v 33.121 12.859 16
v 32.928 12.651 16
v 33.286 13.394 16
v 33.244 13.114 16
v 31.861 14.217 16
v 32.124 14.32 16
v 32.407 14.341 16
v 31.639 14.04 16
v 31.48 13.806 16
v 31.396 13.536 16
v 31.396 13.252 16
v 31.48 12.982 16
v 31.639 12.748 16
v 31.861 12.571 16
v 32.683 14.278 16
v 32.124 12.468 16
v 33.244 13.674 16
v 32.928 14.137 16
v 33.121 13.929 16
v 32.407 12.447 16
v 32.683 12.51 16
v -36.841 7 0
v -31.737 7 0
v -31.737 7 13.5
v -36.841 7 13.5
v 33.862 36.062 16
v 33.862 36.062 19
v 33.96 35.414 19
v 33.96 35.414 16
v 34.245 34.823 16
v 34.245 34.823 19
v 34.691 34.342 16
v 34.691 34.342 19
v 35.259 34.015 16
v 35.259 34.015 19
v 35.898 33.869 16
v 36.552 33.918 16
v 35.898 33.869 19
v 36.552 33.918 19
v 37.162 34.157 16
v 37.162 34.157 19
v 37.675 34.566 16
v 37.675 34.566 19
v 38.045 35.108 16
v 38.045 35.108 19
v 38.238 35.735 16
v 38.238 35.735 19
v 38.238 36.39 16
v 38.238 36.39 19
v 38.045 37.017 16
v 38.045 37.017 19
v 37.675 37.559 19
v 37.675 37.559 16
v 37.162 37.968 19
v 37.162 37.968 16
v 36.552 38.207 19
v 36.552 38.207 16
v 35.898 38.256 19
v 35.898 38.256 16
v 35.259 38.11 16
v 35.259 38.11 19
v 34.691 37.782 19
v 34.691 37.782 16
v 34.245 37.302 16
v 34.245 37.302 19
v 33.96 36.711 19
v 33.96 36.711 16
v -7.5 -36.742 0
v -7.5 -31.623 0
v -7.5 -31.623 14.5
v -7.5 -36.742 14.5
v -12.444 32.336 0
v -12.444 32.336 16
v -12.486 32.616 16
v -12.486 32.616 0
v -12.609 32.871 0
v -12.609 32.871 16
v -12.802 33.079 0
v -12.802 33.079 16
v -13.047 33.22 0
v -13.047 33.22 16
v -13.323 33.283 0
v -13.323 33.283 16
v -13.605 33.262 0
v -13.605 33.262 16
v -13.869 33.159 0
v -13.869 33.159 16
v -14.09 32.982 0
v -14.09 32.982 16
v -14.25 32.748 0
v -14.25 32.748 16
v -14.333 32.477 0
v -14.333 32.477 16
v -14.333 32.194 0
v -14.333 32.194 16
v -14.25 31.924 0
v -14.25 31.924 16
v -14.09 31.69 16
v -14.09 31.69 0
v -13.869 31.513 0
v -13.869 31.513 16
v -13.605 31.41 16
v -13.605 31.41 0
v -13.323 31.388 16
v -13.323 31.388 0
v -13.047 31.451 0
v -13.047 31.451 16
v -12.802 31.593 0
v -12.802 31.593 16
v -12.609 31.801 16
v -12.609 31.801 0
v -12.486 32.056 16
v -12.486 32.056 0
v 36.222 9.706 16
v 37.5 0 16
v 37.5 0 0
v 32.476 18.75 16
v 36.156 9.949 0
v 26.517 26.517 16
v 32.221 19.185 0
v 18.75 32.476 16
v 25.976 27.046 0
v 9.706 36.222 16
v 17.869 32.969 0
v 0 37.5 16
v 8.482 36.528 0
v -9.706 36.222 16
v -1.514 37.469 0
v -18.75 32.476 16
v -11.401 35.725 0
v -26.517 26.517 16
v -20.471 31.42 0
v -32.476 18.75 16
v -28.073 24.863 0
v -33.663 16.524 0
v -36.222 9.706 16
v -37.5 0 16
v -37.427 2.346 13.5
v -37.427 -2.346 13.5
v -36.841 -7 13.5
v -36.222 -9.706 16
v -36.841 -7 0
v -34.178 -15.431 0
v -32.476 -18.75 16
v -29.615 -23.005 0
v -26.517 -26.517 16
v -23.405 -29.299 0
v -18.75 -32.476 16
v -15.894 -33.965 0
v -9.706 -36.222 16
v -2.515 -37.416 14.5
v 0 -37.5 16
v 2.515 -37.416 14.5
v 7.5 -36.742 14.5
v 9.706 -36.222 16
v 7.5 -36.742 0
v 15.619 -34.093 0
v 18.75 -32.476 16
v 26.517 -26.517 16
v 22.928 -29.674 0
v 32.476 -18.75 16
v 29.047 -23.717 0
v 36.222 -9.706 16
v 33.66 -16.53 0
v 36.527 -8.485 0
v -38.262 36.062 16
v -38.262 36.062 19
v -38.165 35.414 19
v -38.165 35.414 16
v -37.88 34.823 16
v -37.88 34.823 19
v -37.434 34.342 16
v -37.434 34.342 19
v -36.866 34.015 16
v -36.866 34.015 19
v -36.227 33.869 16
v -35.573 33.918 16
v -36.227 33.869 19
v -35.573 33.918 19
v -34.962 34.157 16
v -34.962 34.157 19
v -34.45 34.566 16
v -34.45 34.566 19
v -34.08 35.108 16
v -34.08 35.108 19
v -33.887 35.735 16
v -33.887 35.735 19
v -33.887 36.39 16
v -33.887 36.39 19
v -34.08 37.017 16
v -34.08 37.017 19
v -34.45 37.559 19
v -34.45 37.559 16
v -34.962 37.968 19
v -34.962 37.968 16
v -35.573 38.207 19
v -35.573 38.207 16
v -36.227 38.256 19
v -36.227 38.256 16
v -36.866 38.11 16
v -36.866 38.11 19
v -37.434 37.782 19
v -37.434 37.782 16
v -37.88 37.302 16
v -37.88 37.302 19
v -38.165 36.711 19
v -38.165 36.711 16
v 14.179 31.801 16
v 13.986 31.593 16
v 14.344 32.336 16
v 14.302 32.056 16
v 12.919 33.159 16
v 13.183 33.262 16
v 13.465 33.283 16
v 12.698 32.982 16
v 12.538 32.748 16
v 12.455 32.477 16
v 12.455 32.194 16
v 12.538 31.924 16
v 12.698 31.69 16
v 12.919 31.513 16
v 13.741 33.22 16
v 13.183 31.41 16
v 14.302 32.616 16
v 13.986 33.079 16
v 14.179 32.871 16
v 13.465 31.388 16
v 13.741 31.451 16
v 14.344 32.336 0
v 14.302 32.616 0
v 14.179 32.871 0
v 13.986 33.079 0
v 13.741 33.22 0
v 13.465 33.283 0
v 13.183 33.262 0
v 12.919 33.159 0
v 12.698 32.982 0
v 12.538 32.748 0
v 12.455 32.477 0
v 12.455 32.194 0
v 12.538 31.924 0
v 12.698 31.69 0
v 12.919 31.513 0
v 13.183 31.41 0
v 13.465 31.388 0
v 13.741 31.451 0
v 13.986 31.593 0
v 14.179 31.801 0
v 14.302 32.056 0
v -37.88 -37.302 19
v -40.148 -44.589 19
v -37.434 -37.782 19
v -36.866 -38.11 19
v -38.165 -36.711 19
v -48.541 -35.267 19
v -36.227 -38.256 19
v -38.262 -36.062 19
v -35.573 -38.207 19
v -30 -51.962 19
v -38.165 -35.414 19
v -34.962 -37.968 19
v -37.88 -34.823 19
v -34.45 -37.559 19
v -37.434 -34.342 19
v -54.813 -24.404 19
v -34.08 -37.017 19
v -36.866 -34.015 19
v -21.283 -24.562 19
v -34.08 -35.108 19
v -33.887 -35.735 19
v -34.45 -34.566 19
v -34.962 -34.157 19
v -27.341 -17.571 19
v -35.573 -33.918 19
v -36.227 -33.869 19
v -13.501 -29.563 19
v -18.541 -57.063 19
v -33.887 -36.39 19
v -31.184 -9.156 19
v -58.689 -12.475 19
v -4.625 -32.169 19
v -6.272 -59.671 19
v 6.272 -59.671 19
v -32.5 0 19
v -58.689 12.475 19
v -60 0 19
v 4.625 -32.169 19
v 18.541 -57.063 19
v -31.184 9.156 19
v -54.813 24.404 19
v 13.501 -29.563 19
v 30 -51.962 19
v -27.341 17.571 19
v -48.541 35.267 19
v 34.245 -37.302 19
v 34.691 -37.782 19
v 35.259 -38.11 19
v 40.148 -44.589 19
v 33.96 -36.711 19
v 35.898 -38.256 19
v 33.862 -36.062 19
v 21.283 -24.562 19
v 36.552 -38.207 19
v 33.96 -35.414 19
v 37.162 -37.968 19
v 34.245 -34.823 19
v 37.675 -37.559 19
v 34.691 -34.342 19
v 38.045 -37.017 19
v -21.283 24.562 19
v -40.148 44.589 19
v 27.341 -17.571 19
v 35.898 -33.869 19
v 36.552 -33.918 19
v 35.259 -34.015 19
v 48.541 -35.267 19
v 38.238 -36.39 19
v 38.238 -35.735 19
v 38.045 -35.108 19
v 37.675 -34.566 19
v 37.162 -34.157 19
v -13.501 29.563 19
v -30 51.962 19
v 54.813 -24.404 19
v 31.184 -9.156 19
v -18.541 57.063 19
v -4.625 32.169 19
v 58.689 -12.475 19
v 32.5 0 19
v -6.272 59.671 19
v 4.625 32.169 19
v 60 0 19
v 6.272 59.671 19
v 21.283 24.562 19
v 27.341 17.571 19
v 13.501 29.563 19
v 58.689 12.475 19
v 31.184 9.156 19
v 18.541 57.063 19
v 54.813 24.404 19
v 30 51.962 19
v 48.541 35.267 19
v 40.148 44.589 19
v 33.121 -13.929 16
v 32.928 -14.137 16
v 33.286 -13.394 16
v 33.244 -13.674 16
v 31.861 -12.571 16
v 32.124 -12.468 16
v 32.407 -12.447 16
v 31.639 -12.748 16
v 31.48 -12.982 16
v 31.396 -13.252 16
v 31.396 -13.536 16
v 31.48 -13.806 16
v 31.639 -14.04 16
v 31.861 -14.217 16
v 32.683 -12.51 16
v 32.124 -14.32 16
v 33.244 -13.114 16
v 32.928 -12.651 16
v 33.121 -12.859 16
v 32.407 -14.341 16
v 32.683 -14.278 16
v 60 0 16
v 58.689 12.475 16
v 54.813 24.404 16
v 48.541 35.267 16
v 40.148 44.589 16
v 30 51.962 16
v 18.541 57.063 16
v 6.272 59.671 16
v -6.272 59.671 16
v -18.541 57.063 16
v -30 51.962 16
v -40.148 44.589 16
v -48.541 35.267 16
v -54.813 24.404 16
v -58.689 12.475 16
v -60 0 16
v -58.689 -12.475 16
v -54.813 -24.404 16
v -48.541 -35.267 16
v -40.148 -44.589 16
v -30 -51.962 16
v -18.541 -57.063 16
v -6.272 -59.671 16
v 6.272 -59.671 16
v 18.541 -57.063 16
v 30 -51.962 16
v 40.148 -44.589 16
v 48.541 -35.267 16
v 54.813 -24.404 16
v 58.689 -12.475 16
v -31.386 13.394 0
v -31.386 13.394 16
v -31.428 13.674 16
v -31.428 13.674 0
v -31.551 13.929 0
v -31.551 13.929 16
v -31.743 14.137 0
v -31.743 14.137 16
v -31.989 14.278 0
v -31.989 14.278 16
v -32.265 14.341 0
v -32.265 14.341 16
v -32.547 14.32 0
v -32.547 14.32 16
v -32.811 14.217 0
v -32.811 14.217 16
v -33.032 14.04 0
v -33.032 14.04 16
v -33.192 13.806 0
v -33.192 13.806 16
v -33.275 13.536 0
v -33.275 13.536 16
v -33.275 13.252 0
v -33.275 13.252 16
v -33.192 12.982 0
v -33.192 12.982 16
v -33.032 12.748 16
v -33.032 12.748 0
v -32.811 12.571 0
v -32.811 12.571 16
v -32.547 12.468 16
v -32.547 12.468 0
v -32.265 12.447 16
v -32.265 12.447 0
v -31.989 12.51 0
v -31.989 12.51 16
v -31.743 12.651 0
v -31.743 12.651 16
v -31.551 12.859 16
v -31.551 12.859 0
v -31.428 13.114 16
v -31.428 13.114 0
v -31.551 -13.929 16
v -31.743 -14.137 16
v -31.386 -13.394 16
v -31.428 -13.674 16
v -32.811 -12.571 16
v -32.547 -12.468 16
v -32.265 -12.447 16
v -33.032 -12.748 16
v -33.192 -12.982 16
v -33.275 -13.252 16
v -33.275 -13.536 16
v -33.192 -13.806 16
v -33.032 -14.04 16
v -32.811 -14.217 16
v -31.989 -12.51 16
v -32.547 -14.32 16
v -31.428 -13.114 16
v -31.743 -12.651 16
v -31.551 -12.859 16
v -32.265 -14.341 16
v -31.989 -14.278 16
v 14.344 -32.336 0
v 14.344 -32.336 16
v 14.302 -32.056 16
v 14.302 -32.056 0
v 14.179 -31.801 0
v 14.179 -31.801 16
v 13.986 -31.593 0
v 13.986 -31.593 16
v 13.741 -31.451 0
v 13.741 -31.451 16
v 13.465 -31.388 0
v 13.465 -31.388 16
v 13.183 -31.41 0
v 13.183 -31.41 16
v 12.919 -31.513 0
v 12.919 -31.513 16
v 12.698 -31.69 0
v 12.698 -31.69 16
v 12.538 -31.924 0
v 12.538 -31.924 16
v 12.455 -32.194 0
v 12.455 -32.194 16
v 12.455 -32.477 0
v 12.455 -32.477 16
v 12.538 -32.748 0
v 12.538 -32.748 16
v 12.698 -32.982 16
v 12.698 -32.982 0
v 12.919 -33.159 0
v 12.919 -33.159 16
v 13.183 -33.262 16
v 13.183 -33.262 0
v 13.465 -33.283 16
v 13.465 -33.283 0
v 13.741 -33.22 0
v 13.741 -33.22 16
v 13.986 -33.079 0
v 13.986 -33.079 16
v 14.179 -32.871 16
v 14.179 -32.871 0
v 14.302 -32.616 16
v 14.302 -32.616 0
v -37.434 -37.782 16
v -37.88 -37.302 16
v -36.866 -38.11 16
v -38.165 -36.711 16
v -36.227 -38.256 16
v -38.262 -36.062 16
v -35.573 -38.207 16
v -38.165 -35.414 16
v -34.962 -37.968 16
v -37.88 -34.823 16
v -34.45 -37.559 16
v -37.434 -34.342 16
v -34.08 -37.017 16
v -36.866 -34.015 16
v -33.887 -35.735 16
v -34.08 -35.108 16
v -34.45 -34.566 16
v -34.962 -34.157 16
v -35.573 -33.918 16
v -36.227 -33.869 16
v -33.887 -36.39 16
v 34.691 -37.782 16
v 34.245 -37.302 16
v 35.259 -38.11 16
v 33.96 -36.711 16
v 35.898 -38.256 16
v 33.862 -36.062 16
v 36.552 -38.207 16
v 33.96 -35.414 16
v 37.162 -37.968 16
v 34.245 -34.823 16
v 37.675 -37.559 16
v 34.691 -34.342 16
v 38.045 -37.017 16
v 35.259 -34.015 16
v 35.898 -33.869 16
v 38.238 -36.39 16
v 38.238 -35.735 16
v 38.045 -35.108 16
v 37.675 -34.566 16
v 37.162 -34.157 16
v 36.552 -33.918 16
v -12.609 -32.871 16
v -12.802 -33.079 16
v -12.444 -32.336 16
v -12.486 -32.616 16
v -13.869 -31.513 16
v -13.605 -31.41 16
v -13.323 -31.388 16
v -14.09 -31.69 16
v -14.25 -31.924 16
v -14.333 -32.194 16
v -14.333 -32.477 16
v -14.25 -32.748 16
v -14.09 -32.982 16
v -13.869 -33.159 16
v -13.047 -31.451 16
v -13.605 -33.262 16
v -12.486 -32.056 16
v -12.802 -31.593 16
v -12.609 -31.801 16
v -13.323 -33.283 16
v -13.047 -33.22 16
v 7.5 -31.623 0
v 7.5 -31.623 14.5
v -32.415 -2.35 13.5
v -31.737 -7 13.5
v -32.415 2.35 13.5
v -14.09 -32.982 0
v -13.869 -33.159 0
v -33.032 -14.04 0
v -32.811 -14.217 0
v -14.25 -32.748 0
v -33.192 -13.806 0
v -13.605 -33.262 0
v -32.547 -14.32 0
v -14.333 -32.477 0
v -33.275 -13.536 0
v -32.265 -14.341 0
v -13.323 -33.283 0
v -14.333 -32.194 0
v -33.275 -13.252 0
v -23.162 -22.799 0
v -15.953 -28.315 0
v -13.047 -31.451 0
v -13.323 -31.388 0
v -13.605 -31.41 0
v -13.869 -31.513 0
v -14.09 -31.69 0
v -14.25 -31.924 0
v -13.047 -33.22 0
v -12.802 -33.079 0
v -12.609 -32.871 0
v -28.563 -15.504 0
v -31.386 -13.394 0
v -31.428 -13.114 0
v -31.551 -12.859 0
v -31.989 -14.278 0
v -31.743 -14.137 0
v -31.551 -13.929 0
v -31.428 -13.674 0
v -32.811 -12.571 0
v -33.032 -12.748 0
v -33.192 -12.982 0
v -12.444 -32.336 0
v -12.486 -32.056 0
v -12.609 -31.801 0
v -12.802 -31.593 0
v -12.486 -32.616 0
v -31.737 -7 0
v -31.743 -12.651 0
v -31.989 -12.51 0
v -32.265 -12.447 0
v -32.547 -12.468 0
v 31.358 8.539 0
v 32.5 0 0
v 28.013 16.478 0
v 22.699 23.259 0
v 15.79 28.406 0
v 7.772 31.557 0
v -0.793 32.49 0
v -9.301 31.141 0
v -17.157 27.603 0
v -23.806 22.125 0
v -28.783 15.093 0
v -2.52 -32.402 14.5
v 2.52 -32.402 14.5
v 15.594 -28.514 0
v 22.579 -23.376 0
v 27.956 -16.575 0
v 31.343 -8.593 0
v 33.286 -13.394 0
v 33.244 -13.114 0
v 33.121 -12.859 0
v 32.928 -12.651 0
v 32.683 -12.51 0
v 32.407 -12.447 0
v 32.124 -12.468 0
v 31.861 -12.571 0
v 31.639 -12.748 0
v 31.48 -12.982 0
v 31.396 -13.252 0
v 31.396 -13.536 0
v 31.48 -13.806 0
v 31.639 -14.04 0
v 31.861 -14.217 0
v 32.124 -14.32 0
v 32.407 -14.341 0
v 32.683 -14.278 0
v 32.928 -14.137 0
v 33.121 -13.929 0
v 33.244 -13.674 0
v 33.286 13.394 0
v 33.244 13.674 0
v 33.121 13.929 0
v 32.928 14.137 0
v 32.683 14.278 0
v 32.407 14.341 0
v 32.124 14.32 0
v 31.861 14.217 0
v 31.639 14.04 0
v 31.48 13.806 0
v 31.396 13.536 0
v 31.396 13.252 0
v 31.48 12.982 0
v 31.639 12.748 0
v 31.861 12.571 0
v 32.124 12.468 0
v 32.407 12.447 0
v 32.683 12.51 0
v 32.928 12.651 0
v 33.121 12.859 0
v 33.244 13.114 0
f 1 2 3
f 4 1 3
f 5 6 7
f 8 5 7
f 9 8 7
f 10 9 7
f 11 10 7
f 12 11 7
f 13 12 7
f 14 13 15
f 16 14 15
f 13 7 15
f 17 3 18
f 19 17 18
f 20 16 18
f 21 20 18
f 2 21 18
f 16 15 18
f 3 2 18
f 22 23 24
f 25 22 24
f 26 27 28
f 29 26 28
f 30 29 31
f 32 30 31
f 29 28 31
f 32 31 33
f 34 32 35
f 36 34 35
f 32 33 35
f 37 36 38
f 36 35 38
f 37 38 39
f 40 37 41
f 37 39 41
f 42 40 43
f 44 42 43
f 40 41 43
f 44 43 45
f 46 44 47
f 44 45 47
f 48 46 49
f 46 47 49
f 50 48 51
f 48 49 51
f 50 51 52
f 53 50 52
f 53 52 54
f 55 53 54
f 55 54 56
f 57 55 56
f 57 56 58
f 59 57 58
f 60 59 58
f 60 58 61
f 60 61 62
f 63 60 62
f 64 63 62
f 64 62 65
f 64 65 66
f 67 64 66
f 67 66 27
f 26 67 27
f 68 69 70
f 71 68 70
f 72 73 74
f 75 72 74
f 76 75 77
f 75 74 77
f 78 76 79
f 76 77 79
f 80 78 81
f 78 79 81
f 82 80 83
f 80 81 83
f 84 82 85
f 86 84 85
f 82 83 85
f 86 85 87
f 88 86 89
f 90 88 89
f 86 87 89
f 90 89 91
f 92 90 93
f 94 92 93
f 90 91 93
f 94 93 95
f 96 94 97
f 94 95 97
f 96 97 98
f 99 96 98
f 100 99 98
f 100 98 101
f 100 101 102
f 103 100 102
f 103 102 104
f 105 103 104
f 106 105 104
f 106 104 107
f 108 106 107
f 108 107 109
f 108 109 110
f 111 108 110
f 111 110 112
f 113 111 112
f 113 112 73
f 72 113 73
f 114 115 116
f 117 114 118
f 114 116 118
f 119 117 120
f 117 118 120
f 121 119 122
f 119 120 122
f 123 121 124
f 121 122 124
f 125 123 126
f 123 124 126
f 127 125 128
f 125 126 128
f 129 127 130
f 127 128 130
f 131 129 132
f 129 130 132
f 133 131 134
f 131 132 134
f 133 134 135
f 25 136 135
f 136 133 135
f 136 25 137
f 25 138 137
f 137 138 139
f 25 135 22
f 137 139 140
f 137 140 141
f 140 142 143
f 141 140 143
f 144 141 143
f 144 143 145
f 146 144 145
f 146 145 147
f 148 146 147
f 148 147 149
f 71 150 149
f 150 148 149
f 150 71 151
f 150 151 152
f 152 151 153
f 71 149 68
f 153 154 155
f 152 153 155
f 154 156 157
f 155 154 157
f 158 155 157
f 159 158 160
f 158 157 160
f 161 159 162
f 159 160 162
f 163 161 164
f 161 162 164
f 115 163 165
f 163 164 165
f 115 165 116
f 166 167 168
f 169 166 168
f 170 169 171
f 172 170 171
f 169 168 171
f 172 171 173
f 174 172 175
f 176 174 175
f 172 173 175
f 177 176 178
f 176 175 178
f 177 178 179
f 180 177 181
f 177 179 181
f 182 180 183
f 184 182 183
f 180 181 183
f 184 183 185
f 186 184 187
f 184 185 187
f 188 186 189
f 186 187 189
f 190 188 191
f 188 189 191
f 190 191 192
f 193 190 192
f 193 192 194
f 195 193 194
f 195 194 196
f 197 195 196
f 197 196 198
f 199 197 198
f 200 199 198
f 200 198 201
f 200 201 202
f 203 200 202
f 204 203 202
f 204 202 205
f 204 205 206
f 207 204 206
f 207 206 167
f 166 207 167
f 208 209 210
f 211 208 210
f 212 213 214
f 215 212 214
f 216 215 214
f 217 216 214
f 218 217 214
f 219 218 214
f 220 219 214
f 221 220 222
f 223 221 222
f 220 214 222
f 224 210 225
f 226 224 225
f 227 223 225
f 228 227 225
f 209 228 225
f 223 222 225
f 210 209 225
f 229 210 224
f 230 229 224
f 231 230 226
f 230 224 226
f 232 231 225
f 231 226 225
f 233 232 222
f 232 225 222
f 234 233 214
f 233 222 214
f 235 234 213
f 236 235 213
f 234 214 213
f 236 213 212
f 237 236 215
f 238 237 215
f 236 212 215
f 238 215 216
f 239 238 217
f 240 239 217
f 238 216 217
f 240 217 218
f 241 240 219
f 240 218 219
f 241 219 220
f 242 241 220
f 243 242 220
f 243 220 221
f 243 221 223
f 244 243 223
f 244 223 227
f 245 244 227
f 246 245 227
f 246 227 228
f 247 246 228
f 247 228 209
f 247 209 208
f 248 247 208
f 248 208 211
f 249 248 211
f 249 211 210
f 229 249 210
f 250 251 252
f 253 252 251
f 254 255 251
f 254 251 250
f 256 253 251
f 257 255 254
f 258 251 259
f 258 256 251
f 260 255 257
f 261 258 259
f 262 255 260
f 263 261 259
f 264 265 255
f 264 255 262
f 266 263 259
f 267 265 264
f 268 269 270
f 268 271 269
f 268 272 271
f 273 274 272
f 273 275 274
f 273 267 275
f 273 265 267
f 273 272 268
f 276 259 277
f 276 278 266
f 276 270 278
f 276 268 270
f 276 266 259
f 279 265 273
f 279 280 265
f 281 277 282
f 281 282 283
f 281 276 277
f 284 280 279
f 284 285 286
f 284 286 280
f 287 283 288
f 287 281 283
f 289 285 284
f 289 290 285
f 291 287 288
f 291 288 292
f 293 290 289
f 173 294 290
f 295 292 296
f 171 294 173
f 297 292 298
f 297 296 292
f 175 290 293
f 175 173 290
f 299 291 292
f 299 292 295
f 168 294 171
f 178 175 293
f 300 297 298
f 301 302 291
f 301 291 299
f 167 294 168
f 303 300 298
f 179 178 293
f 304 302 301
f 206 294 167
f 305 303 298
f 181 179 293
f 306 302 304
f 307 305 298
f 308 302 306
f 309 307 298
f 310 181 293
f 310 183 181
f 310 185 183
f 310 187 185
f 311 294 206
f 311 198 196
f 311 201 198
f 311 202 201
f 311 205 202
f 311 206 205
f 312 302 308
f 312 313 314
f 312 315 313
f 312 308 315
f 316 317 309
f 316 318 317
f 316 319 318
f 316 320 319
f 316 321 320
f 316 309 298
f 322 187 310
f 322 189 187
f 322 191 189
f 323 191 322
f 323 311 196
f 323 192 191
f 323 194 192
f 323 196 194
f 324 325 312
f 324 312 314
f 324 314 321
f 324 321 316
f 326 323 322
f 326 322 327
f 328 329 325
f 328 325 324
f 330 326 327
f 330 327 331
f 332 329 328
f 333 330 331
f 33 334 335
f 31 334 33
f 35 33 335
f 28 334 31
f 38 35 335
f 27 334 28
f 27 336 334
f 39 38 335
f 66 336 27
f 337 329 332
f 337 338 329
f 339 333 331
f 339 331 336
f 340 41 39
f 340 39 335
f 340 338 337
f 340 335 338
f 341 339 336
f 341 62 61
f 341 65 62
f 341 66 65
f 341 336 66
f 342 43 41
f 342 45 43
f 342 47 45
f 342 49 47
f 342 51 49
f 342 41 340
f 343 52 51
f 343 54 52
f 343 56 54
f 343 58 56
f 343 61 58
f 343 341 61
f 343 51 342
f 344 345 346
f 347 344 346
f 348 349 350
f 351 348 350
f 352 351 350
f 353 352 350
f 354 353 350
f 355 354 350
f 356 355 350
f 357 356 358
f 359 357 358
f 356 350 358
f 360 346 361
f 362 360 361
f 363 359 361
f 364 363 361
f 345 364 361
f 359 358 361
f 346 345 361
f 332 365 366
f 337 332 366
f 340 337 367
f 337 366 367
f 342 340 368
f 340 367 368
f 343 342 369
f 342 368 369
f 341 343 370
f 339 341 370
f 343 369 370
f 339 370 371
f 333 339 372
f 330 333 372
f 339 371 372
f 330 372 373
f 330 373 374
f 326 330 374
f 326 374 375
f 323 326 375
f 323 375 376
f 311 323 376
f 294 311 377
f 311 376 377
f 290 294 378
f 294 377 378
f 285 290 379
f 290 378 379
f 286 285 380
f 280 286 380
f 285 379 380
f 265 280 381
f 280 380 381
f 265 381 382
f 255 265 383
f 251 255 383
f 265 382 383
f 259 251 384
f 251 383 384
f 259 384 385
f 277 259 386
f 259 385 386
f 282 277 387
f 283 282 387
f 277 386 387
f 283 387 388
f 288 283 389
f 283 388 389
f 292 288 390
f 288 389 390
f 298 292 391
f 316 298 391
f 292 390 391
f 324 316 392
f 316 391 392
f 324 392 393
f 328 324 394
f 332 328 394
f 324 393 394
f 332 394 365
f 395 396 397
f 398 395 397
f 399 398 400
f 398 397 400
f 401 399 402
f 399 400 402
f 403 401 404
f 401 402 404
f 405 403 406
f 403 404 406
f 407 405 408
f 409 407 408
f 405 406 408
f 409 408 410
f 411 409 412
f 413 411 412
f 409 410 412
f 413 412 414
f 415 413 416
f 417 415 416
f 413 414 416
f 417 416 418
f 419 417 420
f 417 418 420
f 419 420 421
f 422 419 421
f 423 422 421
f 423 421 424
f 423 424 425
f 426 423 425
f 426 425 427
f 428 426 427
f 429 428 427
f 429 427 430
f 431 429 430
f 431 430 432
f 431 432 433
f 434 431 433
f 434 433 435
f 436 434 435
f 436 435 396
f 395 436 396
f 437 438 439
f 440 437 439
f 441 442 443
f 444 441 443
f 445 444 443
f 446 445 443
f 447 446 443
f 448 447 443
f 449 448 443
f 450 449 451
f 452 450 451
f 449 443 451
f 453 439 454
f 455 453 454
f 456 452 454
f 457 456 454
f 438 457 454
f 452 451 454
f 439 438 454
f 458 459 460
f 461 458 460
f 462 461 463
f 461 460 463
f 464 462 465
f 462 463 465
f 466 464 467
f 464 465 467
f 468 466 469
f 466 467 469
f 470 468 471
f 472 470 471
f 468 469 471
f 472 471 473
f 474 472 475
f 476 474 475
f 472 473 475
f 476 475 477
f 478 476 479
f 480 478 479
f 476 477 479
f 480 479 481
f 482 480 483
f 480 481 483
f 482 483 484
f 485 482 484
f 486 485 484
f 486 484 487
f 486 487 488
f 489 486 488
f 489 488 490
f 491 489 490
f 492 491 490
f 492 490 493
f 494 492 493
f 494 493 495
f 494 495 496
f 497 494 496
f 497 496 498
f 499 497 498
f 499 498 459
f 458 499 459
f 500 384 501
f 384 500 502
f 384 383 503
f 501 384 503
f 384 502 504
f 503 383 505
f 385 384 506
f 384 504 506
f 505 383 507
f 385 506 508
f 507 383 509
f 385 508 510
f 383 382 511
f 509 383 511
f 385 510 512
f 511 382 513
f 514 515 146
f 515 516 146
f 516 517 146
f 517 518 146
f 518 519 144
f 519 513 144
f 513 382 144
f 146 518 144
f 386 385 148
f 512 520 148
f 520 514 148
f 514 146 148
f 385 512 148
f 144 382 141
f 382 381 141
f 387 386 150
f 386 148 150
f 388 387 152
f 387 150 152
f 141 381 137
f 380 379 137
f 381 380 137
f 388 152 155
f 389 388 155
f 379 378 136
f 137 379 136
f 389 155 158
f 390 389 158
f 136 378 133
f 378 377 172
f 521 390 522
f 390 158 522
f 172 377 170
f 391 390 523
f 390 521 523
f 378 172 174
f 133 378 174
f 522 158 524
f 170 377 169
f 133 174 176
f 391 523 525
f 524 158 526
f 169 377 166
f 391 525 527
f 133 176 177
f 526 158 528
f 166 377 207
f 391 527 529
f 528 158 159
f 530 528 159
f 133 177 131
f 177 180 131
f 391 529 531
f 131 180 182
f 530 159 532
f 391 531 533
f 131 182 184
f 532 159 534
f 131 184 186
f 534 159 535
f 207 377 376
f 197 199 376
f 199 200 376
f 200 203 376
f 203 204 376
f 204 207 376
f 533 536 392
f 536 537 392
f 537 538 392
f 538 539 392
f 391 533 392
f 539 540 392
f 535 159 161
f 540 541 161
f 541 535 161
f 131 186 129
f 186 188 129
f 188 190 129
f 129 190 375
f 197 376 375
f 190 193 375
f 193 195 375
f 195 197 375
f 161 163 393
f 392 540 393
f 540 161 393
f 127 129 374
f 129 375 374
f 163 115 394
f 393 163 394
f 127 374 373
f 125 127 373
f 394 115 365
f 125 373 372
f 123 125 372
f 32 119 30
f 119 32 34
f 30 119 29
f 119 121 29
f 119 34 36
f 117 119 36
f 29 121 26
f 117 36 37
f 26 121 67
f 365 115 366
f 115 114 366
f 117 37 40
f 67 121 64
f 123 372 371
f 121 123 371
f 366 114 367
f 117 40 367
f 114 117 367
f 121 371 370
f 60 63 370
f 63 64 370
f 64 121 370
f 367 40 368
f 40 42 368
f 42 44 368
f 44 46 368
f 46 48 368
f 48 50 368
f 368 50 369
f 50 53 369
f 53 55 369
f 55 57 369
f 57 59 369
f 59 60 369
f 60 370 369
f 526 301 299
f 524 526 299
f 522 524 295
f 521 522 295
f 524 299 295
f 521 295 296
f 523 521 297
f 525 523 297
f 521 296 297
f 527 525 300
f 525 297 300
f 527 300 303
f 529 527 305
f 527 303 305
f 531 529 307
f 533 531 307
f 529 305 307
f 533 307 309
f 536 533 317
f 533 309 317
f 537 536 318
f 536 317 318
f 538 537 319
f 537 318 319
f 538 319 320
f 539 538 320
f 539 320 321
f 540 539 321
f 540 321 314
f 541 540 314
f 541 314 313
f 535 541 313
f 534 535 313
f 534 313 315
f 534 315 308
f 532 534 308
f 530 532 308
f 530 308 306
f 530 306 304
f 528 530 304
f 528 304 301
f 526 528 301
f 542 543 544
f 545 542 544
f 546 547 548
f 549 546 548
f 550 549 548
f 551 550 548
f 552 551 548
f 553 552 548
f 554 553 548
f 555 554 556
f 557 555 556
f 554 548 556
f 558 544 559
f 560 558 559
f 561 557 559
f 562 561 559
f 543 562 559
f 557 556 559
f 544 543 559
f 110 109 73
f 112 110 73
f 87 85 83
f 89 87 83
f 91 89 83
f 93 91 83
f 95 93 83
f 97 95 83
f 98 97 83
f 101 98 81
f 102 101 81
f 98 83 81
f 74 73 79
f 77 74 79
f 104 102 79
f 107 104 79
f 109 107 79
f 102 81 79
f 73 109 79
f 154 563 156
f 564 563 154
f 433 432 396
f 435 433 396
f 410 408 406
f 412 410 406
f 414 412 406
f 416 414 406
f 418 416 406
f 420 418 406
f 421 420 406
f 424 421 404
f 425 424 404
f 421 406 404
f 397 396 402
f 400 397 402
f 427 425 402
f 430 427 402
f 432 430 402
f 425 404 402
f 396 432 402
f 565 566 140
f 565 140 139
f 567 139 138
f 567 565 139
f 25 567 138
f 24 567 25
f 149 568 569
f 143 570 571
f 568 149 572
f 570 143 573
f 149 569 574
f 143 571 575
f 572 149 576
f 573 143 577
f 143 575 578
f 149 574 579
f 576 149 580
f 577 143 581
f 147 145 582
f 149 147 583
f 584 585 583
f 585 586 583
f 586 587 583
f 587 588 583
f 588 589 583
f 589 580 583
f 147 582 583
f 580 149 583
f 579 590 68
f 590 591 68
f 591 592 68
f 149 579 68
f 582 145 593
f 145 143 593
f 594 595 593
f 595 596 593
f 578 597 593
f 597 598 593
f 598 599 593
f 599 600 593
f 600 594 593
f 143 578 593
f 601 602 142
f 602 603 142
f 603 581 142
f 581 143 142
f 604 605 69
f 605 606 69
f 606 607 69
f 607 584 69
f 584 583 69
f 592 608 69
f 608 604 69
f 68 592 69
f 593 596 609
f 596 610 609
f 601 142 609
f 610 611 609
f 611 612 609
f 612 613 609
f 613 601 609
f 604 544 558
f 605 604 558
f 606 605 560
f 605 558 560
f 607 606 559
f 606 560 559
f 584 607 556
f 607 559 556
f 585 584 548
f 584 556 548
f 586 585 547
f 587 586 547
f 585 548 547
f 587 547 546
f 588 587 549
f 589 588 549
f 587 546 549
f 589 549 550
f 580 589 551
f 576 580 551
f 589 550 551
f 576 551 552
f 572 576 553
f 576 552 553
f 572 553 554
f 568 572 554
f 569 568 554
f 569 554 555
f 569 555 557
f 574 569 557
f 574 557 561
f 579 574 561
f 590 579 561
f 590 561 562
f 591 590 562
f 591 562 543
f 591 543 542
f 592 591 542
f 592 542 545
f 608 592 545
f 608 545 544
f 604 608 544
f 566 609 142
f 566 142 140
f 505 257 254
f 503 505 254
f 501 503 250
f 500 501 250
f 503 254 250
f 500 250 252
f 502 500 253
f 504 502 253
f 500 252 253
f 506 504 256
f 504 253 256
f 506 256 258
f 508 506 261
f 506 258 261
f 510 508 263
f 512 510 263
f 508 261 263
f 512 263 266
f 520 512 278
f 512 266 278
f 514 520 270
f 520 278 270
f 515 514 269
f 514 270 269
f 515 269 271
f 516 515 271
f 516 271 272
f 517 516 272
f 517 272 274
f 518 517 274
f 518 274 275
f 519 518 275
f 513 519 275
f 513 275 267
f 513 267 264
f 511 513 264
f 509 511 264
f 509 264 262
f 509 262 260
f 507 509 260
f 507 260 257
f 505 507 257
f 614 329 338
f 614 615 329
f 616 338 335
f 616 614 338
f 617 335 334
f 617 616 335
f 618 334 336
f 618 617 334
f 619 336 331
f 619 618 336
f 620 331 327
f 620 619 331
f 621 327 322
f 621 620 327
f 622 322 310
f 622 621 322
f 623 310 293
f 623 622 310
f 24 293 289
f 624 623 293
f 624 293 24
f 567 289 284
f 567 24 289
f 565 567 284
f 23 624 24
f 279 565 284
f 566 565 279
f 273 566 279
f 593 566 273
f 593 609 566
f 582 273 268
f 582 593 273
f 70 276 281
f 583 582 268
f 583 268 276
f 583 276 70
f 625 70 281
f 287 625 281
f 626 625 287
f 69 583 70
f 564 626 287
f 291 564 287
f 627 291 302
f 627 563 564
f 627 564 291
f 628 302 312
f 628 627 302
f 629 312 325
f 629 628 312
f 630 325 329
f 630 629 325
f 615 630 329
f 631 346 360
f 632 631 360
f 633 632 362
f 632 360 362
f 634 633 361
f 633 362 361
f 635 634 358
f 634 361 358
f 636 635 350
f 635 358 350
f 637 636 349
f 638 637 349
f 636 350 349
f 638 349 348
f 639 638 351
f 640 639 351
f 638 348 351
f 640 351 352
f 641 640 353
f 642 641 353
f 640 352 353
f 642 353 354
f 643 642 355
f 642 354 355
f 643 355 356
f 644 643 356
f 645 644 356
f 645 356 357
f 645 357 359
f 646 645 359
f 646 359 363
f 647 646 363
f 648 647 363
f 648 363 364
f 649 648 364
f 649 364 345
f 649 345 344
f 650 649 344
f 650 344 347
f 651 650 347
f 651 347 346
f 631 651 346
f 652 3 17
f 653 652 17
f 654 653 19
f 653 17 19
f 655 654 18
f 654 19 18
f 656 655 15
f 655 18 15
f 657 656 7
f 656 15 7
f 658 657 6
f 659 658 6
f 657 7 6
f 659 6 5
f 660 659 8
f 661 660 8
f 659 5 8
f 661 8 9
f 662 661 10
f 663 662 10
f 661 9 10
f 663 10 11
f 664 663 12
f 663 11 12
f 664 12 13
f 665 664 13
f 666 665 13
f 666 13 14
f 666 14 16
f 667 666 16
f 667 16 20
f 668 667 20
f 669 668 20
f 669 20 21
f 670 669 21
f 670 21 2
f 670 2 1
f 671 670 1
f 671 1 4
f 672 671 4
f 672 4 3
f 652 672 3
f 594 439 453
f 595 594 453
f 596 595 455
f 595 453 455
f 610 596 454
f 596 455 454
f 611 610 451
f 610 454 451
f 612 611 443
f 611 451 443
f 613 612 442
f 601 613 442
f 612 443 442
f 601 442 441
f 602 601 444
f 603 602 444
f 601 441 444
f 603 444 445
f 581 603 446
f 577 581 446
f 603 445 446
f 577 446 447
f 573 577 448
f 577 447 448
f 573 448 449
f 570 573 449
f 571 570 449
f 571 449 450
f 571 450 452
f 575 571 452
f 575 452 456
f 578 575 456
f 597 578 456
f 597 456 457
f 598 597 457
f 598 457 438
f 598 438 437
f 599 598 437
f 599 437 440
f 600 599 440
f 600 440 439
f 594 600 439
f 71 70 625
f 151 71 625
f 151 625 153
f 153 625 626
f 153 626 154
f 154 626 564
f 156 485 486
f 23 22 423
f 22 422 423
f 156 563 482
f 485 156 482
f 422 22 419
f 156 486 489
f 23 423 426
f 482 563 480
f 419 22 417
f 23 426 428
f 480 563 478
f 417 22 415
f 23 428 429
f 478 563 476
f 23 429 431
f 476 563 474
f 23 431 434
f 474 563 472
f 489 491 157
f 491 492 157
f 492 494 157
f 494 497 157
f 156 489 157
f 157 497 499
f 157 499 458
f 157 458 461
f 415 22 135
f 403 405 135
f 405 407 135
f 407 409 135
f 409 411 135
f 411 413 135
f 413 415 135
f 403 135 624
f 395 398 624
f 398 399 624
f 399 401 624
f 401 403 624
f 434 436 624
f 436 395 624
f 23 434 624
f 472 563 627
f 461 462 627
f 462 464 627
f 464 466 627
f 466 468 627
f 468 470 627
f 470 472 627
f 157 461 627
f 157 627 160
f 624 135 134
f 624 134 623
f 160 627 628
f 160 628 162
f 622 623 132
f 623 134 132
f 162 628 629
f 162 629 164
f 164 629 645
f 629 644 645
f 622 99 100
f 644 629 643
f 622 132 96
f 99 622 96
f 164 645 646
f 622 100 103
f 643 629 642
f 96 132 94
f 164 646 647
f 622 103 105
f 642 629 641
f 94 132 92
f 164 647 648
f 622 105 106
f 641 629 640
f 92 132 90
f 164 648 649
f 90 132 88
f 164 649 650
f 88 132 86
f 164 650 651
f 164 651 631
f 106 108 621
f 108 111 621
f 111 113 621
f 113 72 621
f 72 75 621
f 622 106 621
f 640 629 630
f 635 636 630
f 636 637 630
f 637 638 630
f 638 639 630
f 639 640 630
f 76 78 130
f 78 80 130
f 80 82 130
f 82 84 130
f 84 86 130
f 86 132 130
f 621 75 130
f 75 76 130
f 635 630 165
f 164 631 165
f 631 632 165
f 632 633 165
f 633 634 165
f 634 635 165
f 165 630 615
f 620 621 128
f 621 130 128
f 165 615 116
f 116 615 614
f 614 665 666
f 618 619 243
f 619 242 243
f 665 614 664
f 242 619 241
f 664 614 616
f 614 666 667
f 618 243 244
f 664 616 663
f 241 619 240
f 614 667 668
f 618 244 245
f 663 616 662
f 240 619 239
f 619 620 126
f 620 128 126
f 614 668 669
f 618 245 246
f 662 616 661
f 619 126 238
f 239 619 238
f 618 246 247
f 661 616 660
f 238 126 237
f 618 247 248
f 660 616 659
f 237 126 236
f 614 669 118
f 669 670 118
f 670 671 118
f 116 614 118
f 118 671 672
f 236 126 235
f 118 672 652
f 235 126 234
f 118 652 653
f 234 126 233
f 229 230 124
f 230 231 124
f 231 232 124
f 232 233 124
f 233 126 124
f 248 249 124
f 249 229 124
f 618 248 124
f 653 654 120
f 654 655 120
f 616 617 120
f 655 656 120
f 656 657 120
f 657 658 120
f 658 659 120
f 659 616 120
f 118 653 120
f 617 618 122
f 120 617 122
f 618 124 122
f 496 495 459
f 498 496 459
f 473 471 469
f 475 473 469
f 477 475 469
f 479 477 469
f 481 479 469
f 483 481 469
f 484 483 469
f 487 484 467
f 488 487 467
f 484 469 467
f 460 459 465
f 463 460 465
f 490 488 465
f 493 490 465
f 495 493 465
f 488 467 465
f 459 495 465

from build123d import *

# Parameters (mm, degrees)
F0_R     = 37.5
F0_R_2   = 32.5
F1_DEPTH = 16
F2_W     = 14
F2_H     = 13.5
F3_DEPTH = 37.501
F4_W     = 15
F4_H     = 14.5
F5_DEPTH = 50
F6_R     = 60
F6_R_2   = 37.5
F6_R_3   = 32.5
F7_DEPTH = 3
F8_D     = 1.9
F8_DEPTH = 50
F8_TIP   = 0.5708175881
F9_D     = 4.4
F9_DEPTH = 50
F9_TIP   = 1.3218933619


with BuildPart() as f1:
    # F0 (on Top) → F1 (new body)
    with BuildSketch(Plane.XY):
        Circle(F0_R)
        Circle(F0_R_2, mode=Mode.SUBTRACT)
    extrude(amount=F1_DEPTH)

    # F2 (on Right) → F3 (cut, through all)
    with BuildSketch(Plane.YZ):
        with Locations((0, 6.75)):
            Rectangle(F2_W, F2_H)
    extrude(amount=-F3_DEPTH, mode=Mode.SUBTRACT)

    # F4 (on Front) → F5 (cut)
    with BuildSketch(Plane.XZ):
        with Locations((0, 7.25)):
            Rectangle(F4_W, F4_H)
    extrude(amount=F5_DEPTH, mode=Mode.SUBTRACT)

    # F6 (on face) → F7 (join)
    with BuildSketch(Plane.XY.offset(16)):
        Circle(F6_R)
        Circle(F6_R_2, mode=Mode.SUBTRACT)
        Circle(F6_R_2)
        Circle(F6_R_3, mode=Mode.SUBTRACT)
    extrude(amount=F7_DEPTH)

    # F8 (one way)
    with BuildSketch(Plane.XY.offset(16)):
        with Locations((32.3357836379, -13.3939201328), (13.3939201328, 32.3357836379), (-13.3939201328, -32.3357836379), (-32.3357836379, 13.3939201328), (-13.3939201328, 32.3357836379), (32.3357836379, 13.3939201328), (13.3939201328, -32.3357836379), (-32.3357836379, -13.3939201328)):
            Circle(F8_D / 2)
    extrude(amount=-F8_DEPTH, mode=Mode.SUBTRACT)
    with Locations(Plane.XY.offset(16)):
        with Locations((32.3357836379, -13.3939201328), (13.3939201328, 32.3357836379), (-13.3939201328, -32.3357836379), (-32.3357836379, 13.3939201328), (-13.3939201328, 32.3357836379), (32.3357836379, 13.3939201328), (13.3939201328, -32.3357836379), (-32.3357836379, -13.3939201328)):
            with Locations((0, 0, -(F8_DEPTH + F8_TIP / 2))):  # 118° drill point
                Cone(0, F8_D / 2, F8_TIP, mode=Mode.SUBTRACT)

    # F9
    with Locations(Plane(origin=(0, 0, 16), x_dir=(1, 0, 0), z_dir=(0, 0, -1))):
        with Locations((-36.0624458405, -36.0624458405), (36.0624458405, -36.0624458405), (36.0624458405, 36.0624458405), (-36.0624458405, 36.0624458405)):
            Hole(F9_D / 2, depth=F9_DEPTH)
            with Locations((0, 0, -(F9_DEPTH + F9_TIP / 2))):  # 118° drill point
                Cone(0, F9_D / 2, F9_TIP, mode=Mode.SUBTRACT)


solid = f1.part
